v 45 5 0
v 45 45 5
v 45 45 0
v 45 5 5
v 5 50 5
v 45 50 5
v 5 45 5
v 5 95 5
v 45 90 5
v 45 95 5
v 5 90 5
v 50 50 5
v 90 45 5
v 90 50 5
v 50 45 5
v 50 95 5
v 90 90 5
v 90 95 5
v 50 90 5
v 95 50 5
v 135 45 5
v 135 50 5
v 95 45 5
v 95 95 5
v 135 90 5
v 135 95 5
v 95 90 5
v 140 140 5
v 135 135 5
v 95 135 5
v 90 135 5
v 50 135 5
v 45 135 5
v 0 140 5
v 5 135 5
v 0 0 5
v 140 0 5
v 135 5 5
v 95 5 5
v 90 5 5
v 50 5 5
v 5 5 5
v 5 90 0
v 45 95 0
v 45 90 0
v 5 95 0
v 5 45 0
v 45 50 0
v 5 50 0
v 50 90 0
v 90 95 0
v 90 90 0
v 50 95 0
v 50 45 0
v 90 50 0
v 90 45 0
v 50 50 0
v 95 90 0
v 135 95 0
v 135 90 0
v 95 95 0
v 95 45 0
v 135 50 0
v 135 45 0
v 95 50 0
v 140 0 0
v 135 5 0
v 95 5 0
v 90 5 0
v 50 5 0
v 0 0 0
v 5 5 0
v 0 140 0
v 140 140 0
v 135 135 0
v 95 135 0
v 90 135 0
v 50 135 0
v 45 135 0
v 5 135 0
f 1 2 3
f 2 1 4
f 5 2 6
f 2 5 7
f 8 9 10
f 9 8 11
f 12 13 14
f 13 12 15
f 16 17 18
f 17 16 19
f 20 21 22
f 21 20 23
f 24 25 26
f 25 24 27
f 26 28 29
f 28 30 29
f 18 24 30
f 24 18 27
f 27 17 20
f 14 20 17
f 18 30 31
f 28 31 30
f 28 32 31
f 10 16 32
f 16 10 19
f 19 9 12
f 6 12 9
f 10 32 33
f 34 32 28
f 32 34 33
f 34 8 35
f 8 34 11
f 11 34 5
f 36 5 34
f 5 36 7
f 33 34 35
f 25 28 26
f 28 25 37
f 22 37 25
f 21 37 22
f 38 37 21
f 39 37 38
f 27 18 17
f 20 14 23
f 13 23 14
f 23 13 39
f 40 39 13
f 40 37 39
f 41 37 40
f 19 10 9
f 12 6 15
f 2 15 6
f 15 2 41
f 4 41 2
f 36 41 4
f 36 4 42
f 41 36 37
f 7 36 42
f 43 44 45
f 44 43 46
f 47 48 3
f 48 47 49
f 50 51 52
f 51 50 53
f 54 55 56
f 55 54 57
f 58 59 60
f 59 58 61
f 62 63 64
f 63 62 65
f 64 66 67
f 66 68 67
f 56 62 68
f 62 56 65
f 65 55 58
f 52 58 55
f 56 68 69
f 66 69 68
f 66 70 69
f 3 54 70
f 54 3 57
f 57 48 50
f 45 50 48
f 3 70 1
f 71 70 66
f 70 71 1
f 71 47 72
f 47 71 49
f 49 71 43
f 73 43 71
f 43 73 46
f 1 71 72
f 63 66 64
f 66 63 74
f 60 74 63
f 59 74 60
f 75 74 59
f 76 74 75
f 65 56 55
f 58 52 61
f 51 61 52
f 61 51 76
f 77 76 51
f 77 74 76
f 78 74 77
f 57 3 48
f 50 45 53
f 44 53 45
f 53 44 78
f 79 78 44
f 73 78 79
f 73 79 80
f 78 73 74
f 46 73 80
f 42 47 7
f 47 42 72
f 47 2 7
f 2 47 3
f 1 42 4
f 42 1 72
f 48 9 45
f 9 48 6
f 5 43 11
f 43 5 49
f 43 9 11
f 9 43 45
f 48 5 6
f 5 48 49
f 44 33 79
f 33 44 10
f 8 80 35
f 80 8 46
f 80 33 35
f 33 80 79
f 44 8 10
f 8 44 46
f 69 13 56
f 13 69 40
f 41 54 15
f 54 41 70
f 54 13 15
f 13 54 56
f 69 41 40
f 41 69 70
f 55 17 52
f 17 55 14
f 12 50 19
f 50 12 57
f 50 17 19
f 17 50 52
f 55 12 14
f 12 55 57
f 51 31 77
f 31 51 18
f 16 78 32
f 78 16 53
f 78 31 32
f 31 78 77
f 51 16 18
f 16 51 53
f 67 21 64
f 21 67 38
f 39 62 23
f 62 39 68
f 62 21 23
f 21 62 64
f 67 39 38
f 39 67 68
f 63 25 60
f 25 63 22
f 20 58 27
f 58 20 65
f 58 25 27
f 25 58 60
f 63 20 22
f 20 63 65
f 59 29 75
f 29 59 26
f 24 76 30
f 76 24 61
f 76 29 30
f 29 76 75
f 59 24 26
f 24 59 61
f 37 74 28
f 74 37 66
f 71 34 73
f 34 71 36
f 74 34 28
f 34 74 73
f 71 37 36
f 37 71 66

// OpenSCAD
$fa = 1;
$fs = 0.4;

height = 50;
Xsize = 40;
Ysize = 40;
front = 0;
Xnum = 3;
Ynum = 3;
/*
difference() {
    cube([Xsize, Ysize, 5]);
    
    translate([2, 2, 2])
        cube([Xsize - 4, Ysize - 4, height - 7]);
}
*/

difference() {
    cube([(Xsize + 5) * Xnum + 5, (Ysize + 5) * Ynum + 5, 5]);

    for (i=[0: Xnum -1])
        for (j=[0: Ynum -1])
            translate([5 + i * (Xsize + 5) + front, 5 + j * (Ysize + 5) + front, 0])
                cube([Xsize - front, Ysize - front, 5]);
    }        
        
